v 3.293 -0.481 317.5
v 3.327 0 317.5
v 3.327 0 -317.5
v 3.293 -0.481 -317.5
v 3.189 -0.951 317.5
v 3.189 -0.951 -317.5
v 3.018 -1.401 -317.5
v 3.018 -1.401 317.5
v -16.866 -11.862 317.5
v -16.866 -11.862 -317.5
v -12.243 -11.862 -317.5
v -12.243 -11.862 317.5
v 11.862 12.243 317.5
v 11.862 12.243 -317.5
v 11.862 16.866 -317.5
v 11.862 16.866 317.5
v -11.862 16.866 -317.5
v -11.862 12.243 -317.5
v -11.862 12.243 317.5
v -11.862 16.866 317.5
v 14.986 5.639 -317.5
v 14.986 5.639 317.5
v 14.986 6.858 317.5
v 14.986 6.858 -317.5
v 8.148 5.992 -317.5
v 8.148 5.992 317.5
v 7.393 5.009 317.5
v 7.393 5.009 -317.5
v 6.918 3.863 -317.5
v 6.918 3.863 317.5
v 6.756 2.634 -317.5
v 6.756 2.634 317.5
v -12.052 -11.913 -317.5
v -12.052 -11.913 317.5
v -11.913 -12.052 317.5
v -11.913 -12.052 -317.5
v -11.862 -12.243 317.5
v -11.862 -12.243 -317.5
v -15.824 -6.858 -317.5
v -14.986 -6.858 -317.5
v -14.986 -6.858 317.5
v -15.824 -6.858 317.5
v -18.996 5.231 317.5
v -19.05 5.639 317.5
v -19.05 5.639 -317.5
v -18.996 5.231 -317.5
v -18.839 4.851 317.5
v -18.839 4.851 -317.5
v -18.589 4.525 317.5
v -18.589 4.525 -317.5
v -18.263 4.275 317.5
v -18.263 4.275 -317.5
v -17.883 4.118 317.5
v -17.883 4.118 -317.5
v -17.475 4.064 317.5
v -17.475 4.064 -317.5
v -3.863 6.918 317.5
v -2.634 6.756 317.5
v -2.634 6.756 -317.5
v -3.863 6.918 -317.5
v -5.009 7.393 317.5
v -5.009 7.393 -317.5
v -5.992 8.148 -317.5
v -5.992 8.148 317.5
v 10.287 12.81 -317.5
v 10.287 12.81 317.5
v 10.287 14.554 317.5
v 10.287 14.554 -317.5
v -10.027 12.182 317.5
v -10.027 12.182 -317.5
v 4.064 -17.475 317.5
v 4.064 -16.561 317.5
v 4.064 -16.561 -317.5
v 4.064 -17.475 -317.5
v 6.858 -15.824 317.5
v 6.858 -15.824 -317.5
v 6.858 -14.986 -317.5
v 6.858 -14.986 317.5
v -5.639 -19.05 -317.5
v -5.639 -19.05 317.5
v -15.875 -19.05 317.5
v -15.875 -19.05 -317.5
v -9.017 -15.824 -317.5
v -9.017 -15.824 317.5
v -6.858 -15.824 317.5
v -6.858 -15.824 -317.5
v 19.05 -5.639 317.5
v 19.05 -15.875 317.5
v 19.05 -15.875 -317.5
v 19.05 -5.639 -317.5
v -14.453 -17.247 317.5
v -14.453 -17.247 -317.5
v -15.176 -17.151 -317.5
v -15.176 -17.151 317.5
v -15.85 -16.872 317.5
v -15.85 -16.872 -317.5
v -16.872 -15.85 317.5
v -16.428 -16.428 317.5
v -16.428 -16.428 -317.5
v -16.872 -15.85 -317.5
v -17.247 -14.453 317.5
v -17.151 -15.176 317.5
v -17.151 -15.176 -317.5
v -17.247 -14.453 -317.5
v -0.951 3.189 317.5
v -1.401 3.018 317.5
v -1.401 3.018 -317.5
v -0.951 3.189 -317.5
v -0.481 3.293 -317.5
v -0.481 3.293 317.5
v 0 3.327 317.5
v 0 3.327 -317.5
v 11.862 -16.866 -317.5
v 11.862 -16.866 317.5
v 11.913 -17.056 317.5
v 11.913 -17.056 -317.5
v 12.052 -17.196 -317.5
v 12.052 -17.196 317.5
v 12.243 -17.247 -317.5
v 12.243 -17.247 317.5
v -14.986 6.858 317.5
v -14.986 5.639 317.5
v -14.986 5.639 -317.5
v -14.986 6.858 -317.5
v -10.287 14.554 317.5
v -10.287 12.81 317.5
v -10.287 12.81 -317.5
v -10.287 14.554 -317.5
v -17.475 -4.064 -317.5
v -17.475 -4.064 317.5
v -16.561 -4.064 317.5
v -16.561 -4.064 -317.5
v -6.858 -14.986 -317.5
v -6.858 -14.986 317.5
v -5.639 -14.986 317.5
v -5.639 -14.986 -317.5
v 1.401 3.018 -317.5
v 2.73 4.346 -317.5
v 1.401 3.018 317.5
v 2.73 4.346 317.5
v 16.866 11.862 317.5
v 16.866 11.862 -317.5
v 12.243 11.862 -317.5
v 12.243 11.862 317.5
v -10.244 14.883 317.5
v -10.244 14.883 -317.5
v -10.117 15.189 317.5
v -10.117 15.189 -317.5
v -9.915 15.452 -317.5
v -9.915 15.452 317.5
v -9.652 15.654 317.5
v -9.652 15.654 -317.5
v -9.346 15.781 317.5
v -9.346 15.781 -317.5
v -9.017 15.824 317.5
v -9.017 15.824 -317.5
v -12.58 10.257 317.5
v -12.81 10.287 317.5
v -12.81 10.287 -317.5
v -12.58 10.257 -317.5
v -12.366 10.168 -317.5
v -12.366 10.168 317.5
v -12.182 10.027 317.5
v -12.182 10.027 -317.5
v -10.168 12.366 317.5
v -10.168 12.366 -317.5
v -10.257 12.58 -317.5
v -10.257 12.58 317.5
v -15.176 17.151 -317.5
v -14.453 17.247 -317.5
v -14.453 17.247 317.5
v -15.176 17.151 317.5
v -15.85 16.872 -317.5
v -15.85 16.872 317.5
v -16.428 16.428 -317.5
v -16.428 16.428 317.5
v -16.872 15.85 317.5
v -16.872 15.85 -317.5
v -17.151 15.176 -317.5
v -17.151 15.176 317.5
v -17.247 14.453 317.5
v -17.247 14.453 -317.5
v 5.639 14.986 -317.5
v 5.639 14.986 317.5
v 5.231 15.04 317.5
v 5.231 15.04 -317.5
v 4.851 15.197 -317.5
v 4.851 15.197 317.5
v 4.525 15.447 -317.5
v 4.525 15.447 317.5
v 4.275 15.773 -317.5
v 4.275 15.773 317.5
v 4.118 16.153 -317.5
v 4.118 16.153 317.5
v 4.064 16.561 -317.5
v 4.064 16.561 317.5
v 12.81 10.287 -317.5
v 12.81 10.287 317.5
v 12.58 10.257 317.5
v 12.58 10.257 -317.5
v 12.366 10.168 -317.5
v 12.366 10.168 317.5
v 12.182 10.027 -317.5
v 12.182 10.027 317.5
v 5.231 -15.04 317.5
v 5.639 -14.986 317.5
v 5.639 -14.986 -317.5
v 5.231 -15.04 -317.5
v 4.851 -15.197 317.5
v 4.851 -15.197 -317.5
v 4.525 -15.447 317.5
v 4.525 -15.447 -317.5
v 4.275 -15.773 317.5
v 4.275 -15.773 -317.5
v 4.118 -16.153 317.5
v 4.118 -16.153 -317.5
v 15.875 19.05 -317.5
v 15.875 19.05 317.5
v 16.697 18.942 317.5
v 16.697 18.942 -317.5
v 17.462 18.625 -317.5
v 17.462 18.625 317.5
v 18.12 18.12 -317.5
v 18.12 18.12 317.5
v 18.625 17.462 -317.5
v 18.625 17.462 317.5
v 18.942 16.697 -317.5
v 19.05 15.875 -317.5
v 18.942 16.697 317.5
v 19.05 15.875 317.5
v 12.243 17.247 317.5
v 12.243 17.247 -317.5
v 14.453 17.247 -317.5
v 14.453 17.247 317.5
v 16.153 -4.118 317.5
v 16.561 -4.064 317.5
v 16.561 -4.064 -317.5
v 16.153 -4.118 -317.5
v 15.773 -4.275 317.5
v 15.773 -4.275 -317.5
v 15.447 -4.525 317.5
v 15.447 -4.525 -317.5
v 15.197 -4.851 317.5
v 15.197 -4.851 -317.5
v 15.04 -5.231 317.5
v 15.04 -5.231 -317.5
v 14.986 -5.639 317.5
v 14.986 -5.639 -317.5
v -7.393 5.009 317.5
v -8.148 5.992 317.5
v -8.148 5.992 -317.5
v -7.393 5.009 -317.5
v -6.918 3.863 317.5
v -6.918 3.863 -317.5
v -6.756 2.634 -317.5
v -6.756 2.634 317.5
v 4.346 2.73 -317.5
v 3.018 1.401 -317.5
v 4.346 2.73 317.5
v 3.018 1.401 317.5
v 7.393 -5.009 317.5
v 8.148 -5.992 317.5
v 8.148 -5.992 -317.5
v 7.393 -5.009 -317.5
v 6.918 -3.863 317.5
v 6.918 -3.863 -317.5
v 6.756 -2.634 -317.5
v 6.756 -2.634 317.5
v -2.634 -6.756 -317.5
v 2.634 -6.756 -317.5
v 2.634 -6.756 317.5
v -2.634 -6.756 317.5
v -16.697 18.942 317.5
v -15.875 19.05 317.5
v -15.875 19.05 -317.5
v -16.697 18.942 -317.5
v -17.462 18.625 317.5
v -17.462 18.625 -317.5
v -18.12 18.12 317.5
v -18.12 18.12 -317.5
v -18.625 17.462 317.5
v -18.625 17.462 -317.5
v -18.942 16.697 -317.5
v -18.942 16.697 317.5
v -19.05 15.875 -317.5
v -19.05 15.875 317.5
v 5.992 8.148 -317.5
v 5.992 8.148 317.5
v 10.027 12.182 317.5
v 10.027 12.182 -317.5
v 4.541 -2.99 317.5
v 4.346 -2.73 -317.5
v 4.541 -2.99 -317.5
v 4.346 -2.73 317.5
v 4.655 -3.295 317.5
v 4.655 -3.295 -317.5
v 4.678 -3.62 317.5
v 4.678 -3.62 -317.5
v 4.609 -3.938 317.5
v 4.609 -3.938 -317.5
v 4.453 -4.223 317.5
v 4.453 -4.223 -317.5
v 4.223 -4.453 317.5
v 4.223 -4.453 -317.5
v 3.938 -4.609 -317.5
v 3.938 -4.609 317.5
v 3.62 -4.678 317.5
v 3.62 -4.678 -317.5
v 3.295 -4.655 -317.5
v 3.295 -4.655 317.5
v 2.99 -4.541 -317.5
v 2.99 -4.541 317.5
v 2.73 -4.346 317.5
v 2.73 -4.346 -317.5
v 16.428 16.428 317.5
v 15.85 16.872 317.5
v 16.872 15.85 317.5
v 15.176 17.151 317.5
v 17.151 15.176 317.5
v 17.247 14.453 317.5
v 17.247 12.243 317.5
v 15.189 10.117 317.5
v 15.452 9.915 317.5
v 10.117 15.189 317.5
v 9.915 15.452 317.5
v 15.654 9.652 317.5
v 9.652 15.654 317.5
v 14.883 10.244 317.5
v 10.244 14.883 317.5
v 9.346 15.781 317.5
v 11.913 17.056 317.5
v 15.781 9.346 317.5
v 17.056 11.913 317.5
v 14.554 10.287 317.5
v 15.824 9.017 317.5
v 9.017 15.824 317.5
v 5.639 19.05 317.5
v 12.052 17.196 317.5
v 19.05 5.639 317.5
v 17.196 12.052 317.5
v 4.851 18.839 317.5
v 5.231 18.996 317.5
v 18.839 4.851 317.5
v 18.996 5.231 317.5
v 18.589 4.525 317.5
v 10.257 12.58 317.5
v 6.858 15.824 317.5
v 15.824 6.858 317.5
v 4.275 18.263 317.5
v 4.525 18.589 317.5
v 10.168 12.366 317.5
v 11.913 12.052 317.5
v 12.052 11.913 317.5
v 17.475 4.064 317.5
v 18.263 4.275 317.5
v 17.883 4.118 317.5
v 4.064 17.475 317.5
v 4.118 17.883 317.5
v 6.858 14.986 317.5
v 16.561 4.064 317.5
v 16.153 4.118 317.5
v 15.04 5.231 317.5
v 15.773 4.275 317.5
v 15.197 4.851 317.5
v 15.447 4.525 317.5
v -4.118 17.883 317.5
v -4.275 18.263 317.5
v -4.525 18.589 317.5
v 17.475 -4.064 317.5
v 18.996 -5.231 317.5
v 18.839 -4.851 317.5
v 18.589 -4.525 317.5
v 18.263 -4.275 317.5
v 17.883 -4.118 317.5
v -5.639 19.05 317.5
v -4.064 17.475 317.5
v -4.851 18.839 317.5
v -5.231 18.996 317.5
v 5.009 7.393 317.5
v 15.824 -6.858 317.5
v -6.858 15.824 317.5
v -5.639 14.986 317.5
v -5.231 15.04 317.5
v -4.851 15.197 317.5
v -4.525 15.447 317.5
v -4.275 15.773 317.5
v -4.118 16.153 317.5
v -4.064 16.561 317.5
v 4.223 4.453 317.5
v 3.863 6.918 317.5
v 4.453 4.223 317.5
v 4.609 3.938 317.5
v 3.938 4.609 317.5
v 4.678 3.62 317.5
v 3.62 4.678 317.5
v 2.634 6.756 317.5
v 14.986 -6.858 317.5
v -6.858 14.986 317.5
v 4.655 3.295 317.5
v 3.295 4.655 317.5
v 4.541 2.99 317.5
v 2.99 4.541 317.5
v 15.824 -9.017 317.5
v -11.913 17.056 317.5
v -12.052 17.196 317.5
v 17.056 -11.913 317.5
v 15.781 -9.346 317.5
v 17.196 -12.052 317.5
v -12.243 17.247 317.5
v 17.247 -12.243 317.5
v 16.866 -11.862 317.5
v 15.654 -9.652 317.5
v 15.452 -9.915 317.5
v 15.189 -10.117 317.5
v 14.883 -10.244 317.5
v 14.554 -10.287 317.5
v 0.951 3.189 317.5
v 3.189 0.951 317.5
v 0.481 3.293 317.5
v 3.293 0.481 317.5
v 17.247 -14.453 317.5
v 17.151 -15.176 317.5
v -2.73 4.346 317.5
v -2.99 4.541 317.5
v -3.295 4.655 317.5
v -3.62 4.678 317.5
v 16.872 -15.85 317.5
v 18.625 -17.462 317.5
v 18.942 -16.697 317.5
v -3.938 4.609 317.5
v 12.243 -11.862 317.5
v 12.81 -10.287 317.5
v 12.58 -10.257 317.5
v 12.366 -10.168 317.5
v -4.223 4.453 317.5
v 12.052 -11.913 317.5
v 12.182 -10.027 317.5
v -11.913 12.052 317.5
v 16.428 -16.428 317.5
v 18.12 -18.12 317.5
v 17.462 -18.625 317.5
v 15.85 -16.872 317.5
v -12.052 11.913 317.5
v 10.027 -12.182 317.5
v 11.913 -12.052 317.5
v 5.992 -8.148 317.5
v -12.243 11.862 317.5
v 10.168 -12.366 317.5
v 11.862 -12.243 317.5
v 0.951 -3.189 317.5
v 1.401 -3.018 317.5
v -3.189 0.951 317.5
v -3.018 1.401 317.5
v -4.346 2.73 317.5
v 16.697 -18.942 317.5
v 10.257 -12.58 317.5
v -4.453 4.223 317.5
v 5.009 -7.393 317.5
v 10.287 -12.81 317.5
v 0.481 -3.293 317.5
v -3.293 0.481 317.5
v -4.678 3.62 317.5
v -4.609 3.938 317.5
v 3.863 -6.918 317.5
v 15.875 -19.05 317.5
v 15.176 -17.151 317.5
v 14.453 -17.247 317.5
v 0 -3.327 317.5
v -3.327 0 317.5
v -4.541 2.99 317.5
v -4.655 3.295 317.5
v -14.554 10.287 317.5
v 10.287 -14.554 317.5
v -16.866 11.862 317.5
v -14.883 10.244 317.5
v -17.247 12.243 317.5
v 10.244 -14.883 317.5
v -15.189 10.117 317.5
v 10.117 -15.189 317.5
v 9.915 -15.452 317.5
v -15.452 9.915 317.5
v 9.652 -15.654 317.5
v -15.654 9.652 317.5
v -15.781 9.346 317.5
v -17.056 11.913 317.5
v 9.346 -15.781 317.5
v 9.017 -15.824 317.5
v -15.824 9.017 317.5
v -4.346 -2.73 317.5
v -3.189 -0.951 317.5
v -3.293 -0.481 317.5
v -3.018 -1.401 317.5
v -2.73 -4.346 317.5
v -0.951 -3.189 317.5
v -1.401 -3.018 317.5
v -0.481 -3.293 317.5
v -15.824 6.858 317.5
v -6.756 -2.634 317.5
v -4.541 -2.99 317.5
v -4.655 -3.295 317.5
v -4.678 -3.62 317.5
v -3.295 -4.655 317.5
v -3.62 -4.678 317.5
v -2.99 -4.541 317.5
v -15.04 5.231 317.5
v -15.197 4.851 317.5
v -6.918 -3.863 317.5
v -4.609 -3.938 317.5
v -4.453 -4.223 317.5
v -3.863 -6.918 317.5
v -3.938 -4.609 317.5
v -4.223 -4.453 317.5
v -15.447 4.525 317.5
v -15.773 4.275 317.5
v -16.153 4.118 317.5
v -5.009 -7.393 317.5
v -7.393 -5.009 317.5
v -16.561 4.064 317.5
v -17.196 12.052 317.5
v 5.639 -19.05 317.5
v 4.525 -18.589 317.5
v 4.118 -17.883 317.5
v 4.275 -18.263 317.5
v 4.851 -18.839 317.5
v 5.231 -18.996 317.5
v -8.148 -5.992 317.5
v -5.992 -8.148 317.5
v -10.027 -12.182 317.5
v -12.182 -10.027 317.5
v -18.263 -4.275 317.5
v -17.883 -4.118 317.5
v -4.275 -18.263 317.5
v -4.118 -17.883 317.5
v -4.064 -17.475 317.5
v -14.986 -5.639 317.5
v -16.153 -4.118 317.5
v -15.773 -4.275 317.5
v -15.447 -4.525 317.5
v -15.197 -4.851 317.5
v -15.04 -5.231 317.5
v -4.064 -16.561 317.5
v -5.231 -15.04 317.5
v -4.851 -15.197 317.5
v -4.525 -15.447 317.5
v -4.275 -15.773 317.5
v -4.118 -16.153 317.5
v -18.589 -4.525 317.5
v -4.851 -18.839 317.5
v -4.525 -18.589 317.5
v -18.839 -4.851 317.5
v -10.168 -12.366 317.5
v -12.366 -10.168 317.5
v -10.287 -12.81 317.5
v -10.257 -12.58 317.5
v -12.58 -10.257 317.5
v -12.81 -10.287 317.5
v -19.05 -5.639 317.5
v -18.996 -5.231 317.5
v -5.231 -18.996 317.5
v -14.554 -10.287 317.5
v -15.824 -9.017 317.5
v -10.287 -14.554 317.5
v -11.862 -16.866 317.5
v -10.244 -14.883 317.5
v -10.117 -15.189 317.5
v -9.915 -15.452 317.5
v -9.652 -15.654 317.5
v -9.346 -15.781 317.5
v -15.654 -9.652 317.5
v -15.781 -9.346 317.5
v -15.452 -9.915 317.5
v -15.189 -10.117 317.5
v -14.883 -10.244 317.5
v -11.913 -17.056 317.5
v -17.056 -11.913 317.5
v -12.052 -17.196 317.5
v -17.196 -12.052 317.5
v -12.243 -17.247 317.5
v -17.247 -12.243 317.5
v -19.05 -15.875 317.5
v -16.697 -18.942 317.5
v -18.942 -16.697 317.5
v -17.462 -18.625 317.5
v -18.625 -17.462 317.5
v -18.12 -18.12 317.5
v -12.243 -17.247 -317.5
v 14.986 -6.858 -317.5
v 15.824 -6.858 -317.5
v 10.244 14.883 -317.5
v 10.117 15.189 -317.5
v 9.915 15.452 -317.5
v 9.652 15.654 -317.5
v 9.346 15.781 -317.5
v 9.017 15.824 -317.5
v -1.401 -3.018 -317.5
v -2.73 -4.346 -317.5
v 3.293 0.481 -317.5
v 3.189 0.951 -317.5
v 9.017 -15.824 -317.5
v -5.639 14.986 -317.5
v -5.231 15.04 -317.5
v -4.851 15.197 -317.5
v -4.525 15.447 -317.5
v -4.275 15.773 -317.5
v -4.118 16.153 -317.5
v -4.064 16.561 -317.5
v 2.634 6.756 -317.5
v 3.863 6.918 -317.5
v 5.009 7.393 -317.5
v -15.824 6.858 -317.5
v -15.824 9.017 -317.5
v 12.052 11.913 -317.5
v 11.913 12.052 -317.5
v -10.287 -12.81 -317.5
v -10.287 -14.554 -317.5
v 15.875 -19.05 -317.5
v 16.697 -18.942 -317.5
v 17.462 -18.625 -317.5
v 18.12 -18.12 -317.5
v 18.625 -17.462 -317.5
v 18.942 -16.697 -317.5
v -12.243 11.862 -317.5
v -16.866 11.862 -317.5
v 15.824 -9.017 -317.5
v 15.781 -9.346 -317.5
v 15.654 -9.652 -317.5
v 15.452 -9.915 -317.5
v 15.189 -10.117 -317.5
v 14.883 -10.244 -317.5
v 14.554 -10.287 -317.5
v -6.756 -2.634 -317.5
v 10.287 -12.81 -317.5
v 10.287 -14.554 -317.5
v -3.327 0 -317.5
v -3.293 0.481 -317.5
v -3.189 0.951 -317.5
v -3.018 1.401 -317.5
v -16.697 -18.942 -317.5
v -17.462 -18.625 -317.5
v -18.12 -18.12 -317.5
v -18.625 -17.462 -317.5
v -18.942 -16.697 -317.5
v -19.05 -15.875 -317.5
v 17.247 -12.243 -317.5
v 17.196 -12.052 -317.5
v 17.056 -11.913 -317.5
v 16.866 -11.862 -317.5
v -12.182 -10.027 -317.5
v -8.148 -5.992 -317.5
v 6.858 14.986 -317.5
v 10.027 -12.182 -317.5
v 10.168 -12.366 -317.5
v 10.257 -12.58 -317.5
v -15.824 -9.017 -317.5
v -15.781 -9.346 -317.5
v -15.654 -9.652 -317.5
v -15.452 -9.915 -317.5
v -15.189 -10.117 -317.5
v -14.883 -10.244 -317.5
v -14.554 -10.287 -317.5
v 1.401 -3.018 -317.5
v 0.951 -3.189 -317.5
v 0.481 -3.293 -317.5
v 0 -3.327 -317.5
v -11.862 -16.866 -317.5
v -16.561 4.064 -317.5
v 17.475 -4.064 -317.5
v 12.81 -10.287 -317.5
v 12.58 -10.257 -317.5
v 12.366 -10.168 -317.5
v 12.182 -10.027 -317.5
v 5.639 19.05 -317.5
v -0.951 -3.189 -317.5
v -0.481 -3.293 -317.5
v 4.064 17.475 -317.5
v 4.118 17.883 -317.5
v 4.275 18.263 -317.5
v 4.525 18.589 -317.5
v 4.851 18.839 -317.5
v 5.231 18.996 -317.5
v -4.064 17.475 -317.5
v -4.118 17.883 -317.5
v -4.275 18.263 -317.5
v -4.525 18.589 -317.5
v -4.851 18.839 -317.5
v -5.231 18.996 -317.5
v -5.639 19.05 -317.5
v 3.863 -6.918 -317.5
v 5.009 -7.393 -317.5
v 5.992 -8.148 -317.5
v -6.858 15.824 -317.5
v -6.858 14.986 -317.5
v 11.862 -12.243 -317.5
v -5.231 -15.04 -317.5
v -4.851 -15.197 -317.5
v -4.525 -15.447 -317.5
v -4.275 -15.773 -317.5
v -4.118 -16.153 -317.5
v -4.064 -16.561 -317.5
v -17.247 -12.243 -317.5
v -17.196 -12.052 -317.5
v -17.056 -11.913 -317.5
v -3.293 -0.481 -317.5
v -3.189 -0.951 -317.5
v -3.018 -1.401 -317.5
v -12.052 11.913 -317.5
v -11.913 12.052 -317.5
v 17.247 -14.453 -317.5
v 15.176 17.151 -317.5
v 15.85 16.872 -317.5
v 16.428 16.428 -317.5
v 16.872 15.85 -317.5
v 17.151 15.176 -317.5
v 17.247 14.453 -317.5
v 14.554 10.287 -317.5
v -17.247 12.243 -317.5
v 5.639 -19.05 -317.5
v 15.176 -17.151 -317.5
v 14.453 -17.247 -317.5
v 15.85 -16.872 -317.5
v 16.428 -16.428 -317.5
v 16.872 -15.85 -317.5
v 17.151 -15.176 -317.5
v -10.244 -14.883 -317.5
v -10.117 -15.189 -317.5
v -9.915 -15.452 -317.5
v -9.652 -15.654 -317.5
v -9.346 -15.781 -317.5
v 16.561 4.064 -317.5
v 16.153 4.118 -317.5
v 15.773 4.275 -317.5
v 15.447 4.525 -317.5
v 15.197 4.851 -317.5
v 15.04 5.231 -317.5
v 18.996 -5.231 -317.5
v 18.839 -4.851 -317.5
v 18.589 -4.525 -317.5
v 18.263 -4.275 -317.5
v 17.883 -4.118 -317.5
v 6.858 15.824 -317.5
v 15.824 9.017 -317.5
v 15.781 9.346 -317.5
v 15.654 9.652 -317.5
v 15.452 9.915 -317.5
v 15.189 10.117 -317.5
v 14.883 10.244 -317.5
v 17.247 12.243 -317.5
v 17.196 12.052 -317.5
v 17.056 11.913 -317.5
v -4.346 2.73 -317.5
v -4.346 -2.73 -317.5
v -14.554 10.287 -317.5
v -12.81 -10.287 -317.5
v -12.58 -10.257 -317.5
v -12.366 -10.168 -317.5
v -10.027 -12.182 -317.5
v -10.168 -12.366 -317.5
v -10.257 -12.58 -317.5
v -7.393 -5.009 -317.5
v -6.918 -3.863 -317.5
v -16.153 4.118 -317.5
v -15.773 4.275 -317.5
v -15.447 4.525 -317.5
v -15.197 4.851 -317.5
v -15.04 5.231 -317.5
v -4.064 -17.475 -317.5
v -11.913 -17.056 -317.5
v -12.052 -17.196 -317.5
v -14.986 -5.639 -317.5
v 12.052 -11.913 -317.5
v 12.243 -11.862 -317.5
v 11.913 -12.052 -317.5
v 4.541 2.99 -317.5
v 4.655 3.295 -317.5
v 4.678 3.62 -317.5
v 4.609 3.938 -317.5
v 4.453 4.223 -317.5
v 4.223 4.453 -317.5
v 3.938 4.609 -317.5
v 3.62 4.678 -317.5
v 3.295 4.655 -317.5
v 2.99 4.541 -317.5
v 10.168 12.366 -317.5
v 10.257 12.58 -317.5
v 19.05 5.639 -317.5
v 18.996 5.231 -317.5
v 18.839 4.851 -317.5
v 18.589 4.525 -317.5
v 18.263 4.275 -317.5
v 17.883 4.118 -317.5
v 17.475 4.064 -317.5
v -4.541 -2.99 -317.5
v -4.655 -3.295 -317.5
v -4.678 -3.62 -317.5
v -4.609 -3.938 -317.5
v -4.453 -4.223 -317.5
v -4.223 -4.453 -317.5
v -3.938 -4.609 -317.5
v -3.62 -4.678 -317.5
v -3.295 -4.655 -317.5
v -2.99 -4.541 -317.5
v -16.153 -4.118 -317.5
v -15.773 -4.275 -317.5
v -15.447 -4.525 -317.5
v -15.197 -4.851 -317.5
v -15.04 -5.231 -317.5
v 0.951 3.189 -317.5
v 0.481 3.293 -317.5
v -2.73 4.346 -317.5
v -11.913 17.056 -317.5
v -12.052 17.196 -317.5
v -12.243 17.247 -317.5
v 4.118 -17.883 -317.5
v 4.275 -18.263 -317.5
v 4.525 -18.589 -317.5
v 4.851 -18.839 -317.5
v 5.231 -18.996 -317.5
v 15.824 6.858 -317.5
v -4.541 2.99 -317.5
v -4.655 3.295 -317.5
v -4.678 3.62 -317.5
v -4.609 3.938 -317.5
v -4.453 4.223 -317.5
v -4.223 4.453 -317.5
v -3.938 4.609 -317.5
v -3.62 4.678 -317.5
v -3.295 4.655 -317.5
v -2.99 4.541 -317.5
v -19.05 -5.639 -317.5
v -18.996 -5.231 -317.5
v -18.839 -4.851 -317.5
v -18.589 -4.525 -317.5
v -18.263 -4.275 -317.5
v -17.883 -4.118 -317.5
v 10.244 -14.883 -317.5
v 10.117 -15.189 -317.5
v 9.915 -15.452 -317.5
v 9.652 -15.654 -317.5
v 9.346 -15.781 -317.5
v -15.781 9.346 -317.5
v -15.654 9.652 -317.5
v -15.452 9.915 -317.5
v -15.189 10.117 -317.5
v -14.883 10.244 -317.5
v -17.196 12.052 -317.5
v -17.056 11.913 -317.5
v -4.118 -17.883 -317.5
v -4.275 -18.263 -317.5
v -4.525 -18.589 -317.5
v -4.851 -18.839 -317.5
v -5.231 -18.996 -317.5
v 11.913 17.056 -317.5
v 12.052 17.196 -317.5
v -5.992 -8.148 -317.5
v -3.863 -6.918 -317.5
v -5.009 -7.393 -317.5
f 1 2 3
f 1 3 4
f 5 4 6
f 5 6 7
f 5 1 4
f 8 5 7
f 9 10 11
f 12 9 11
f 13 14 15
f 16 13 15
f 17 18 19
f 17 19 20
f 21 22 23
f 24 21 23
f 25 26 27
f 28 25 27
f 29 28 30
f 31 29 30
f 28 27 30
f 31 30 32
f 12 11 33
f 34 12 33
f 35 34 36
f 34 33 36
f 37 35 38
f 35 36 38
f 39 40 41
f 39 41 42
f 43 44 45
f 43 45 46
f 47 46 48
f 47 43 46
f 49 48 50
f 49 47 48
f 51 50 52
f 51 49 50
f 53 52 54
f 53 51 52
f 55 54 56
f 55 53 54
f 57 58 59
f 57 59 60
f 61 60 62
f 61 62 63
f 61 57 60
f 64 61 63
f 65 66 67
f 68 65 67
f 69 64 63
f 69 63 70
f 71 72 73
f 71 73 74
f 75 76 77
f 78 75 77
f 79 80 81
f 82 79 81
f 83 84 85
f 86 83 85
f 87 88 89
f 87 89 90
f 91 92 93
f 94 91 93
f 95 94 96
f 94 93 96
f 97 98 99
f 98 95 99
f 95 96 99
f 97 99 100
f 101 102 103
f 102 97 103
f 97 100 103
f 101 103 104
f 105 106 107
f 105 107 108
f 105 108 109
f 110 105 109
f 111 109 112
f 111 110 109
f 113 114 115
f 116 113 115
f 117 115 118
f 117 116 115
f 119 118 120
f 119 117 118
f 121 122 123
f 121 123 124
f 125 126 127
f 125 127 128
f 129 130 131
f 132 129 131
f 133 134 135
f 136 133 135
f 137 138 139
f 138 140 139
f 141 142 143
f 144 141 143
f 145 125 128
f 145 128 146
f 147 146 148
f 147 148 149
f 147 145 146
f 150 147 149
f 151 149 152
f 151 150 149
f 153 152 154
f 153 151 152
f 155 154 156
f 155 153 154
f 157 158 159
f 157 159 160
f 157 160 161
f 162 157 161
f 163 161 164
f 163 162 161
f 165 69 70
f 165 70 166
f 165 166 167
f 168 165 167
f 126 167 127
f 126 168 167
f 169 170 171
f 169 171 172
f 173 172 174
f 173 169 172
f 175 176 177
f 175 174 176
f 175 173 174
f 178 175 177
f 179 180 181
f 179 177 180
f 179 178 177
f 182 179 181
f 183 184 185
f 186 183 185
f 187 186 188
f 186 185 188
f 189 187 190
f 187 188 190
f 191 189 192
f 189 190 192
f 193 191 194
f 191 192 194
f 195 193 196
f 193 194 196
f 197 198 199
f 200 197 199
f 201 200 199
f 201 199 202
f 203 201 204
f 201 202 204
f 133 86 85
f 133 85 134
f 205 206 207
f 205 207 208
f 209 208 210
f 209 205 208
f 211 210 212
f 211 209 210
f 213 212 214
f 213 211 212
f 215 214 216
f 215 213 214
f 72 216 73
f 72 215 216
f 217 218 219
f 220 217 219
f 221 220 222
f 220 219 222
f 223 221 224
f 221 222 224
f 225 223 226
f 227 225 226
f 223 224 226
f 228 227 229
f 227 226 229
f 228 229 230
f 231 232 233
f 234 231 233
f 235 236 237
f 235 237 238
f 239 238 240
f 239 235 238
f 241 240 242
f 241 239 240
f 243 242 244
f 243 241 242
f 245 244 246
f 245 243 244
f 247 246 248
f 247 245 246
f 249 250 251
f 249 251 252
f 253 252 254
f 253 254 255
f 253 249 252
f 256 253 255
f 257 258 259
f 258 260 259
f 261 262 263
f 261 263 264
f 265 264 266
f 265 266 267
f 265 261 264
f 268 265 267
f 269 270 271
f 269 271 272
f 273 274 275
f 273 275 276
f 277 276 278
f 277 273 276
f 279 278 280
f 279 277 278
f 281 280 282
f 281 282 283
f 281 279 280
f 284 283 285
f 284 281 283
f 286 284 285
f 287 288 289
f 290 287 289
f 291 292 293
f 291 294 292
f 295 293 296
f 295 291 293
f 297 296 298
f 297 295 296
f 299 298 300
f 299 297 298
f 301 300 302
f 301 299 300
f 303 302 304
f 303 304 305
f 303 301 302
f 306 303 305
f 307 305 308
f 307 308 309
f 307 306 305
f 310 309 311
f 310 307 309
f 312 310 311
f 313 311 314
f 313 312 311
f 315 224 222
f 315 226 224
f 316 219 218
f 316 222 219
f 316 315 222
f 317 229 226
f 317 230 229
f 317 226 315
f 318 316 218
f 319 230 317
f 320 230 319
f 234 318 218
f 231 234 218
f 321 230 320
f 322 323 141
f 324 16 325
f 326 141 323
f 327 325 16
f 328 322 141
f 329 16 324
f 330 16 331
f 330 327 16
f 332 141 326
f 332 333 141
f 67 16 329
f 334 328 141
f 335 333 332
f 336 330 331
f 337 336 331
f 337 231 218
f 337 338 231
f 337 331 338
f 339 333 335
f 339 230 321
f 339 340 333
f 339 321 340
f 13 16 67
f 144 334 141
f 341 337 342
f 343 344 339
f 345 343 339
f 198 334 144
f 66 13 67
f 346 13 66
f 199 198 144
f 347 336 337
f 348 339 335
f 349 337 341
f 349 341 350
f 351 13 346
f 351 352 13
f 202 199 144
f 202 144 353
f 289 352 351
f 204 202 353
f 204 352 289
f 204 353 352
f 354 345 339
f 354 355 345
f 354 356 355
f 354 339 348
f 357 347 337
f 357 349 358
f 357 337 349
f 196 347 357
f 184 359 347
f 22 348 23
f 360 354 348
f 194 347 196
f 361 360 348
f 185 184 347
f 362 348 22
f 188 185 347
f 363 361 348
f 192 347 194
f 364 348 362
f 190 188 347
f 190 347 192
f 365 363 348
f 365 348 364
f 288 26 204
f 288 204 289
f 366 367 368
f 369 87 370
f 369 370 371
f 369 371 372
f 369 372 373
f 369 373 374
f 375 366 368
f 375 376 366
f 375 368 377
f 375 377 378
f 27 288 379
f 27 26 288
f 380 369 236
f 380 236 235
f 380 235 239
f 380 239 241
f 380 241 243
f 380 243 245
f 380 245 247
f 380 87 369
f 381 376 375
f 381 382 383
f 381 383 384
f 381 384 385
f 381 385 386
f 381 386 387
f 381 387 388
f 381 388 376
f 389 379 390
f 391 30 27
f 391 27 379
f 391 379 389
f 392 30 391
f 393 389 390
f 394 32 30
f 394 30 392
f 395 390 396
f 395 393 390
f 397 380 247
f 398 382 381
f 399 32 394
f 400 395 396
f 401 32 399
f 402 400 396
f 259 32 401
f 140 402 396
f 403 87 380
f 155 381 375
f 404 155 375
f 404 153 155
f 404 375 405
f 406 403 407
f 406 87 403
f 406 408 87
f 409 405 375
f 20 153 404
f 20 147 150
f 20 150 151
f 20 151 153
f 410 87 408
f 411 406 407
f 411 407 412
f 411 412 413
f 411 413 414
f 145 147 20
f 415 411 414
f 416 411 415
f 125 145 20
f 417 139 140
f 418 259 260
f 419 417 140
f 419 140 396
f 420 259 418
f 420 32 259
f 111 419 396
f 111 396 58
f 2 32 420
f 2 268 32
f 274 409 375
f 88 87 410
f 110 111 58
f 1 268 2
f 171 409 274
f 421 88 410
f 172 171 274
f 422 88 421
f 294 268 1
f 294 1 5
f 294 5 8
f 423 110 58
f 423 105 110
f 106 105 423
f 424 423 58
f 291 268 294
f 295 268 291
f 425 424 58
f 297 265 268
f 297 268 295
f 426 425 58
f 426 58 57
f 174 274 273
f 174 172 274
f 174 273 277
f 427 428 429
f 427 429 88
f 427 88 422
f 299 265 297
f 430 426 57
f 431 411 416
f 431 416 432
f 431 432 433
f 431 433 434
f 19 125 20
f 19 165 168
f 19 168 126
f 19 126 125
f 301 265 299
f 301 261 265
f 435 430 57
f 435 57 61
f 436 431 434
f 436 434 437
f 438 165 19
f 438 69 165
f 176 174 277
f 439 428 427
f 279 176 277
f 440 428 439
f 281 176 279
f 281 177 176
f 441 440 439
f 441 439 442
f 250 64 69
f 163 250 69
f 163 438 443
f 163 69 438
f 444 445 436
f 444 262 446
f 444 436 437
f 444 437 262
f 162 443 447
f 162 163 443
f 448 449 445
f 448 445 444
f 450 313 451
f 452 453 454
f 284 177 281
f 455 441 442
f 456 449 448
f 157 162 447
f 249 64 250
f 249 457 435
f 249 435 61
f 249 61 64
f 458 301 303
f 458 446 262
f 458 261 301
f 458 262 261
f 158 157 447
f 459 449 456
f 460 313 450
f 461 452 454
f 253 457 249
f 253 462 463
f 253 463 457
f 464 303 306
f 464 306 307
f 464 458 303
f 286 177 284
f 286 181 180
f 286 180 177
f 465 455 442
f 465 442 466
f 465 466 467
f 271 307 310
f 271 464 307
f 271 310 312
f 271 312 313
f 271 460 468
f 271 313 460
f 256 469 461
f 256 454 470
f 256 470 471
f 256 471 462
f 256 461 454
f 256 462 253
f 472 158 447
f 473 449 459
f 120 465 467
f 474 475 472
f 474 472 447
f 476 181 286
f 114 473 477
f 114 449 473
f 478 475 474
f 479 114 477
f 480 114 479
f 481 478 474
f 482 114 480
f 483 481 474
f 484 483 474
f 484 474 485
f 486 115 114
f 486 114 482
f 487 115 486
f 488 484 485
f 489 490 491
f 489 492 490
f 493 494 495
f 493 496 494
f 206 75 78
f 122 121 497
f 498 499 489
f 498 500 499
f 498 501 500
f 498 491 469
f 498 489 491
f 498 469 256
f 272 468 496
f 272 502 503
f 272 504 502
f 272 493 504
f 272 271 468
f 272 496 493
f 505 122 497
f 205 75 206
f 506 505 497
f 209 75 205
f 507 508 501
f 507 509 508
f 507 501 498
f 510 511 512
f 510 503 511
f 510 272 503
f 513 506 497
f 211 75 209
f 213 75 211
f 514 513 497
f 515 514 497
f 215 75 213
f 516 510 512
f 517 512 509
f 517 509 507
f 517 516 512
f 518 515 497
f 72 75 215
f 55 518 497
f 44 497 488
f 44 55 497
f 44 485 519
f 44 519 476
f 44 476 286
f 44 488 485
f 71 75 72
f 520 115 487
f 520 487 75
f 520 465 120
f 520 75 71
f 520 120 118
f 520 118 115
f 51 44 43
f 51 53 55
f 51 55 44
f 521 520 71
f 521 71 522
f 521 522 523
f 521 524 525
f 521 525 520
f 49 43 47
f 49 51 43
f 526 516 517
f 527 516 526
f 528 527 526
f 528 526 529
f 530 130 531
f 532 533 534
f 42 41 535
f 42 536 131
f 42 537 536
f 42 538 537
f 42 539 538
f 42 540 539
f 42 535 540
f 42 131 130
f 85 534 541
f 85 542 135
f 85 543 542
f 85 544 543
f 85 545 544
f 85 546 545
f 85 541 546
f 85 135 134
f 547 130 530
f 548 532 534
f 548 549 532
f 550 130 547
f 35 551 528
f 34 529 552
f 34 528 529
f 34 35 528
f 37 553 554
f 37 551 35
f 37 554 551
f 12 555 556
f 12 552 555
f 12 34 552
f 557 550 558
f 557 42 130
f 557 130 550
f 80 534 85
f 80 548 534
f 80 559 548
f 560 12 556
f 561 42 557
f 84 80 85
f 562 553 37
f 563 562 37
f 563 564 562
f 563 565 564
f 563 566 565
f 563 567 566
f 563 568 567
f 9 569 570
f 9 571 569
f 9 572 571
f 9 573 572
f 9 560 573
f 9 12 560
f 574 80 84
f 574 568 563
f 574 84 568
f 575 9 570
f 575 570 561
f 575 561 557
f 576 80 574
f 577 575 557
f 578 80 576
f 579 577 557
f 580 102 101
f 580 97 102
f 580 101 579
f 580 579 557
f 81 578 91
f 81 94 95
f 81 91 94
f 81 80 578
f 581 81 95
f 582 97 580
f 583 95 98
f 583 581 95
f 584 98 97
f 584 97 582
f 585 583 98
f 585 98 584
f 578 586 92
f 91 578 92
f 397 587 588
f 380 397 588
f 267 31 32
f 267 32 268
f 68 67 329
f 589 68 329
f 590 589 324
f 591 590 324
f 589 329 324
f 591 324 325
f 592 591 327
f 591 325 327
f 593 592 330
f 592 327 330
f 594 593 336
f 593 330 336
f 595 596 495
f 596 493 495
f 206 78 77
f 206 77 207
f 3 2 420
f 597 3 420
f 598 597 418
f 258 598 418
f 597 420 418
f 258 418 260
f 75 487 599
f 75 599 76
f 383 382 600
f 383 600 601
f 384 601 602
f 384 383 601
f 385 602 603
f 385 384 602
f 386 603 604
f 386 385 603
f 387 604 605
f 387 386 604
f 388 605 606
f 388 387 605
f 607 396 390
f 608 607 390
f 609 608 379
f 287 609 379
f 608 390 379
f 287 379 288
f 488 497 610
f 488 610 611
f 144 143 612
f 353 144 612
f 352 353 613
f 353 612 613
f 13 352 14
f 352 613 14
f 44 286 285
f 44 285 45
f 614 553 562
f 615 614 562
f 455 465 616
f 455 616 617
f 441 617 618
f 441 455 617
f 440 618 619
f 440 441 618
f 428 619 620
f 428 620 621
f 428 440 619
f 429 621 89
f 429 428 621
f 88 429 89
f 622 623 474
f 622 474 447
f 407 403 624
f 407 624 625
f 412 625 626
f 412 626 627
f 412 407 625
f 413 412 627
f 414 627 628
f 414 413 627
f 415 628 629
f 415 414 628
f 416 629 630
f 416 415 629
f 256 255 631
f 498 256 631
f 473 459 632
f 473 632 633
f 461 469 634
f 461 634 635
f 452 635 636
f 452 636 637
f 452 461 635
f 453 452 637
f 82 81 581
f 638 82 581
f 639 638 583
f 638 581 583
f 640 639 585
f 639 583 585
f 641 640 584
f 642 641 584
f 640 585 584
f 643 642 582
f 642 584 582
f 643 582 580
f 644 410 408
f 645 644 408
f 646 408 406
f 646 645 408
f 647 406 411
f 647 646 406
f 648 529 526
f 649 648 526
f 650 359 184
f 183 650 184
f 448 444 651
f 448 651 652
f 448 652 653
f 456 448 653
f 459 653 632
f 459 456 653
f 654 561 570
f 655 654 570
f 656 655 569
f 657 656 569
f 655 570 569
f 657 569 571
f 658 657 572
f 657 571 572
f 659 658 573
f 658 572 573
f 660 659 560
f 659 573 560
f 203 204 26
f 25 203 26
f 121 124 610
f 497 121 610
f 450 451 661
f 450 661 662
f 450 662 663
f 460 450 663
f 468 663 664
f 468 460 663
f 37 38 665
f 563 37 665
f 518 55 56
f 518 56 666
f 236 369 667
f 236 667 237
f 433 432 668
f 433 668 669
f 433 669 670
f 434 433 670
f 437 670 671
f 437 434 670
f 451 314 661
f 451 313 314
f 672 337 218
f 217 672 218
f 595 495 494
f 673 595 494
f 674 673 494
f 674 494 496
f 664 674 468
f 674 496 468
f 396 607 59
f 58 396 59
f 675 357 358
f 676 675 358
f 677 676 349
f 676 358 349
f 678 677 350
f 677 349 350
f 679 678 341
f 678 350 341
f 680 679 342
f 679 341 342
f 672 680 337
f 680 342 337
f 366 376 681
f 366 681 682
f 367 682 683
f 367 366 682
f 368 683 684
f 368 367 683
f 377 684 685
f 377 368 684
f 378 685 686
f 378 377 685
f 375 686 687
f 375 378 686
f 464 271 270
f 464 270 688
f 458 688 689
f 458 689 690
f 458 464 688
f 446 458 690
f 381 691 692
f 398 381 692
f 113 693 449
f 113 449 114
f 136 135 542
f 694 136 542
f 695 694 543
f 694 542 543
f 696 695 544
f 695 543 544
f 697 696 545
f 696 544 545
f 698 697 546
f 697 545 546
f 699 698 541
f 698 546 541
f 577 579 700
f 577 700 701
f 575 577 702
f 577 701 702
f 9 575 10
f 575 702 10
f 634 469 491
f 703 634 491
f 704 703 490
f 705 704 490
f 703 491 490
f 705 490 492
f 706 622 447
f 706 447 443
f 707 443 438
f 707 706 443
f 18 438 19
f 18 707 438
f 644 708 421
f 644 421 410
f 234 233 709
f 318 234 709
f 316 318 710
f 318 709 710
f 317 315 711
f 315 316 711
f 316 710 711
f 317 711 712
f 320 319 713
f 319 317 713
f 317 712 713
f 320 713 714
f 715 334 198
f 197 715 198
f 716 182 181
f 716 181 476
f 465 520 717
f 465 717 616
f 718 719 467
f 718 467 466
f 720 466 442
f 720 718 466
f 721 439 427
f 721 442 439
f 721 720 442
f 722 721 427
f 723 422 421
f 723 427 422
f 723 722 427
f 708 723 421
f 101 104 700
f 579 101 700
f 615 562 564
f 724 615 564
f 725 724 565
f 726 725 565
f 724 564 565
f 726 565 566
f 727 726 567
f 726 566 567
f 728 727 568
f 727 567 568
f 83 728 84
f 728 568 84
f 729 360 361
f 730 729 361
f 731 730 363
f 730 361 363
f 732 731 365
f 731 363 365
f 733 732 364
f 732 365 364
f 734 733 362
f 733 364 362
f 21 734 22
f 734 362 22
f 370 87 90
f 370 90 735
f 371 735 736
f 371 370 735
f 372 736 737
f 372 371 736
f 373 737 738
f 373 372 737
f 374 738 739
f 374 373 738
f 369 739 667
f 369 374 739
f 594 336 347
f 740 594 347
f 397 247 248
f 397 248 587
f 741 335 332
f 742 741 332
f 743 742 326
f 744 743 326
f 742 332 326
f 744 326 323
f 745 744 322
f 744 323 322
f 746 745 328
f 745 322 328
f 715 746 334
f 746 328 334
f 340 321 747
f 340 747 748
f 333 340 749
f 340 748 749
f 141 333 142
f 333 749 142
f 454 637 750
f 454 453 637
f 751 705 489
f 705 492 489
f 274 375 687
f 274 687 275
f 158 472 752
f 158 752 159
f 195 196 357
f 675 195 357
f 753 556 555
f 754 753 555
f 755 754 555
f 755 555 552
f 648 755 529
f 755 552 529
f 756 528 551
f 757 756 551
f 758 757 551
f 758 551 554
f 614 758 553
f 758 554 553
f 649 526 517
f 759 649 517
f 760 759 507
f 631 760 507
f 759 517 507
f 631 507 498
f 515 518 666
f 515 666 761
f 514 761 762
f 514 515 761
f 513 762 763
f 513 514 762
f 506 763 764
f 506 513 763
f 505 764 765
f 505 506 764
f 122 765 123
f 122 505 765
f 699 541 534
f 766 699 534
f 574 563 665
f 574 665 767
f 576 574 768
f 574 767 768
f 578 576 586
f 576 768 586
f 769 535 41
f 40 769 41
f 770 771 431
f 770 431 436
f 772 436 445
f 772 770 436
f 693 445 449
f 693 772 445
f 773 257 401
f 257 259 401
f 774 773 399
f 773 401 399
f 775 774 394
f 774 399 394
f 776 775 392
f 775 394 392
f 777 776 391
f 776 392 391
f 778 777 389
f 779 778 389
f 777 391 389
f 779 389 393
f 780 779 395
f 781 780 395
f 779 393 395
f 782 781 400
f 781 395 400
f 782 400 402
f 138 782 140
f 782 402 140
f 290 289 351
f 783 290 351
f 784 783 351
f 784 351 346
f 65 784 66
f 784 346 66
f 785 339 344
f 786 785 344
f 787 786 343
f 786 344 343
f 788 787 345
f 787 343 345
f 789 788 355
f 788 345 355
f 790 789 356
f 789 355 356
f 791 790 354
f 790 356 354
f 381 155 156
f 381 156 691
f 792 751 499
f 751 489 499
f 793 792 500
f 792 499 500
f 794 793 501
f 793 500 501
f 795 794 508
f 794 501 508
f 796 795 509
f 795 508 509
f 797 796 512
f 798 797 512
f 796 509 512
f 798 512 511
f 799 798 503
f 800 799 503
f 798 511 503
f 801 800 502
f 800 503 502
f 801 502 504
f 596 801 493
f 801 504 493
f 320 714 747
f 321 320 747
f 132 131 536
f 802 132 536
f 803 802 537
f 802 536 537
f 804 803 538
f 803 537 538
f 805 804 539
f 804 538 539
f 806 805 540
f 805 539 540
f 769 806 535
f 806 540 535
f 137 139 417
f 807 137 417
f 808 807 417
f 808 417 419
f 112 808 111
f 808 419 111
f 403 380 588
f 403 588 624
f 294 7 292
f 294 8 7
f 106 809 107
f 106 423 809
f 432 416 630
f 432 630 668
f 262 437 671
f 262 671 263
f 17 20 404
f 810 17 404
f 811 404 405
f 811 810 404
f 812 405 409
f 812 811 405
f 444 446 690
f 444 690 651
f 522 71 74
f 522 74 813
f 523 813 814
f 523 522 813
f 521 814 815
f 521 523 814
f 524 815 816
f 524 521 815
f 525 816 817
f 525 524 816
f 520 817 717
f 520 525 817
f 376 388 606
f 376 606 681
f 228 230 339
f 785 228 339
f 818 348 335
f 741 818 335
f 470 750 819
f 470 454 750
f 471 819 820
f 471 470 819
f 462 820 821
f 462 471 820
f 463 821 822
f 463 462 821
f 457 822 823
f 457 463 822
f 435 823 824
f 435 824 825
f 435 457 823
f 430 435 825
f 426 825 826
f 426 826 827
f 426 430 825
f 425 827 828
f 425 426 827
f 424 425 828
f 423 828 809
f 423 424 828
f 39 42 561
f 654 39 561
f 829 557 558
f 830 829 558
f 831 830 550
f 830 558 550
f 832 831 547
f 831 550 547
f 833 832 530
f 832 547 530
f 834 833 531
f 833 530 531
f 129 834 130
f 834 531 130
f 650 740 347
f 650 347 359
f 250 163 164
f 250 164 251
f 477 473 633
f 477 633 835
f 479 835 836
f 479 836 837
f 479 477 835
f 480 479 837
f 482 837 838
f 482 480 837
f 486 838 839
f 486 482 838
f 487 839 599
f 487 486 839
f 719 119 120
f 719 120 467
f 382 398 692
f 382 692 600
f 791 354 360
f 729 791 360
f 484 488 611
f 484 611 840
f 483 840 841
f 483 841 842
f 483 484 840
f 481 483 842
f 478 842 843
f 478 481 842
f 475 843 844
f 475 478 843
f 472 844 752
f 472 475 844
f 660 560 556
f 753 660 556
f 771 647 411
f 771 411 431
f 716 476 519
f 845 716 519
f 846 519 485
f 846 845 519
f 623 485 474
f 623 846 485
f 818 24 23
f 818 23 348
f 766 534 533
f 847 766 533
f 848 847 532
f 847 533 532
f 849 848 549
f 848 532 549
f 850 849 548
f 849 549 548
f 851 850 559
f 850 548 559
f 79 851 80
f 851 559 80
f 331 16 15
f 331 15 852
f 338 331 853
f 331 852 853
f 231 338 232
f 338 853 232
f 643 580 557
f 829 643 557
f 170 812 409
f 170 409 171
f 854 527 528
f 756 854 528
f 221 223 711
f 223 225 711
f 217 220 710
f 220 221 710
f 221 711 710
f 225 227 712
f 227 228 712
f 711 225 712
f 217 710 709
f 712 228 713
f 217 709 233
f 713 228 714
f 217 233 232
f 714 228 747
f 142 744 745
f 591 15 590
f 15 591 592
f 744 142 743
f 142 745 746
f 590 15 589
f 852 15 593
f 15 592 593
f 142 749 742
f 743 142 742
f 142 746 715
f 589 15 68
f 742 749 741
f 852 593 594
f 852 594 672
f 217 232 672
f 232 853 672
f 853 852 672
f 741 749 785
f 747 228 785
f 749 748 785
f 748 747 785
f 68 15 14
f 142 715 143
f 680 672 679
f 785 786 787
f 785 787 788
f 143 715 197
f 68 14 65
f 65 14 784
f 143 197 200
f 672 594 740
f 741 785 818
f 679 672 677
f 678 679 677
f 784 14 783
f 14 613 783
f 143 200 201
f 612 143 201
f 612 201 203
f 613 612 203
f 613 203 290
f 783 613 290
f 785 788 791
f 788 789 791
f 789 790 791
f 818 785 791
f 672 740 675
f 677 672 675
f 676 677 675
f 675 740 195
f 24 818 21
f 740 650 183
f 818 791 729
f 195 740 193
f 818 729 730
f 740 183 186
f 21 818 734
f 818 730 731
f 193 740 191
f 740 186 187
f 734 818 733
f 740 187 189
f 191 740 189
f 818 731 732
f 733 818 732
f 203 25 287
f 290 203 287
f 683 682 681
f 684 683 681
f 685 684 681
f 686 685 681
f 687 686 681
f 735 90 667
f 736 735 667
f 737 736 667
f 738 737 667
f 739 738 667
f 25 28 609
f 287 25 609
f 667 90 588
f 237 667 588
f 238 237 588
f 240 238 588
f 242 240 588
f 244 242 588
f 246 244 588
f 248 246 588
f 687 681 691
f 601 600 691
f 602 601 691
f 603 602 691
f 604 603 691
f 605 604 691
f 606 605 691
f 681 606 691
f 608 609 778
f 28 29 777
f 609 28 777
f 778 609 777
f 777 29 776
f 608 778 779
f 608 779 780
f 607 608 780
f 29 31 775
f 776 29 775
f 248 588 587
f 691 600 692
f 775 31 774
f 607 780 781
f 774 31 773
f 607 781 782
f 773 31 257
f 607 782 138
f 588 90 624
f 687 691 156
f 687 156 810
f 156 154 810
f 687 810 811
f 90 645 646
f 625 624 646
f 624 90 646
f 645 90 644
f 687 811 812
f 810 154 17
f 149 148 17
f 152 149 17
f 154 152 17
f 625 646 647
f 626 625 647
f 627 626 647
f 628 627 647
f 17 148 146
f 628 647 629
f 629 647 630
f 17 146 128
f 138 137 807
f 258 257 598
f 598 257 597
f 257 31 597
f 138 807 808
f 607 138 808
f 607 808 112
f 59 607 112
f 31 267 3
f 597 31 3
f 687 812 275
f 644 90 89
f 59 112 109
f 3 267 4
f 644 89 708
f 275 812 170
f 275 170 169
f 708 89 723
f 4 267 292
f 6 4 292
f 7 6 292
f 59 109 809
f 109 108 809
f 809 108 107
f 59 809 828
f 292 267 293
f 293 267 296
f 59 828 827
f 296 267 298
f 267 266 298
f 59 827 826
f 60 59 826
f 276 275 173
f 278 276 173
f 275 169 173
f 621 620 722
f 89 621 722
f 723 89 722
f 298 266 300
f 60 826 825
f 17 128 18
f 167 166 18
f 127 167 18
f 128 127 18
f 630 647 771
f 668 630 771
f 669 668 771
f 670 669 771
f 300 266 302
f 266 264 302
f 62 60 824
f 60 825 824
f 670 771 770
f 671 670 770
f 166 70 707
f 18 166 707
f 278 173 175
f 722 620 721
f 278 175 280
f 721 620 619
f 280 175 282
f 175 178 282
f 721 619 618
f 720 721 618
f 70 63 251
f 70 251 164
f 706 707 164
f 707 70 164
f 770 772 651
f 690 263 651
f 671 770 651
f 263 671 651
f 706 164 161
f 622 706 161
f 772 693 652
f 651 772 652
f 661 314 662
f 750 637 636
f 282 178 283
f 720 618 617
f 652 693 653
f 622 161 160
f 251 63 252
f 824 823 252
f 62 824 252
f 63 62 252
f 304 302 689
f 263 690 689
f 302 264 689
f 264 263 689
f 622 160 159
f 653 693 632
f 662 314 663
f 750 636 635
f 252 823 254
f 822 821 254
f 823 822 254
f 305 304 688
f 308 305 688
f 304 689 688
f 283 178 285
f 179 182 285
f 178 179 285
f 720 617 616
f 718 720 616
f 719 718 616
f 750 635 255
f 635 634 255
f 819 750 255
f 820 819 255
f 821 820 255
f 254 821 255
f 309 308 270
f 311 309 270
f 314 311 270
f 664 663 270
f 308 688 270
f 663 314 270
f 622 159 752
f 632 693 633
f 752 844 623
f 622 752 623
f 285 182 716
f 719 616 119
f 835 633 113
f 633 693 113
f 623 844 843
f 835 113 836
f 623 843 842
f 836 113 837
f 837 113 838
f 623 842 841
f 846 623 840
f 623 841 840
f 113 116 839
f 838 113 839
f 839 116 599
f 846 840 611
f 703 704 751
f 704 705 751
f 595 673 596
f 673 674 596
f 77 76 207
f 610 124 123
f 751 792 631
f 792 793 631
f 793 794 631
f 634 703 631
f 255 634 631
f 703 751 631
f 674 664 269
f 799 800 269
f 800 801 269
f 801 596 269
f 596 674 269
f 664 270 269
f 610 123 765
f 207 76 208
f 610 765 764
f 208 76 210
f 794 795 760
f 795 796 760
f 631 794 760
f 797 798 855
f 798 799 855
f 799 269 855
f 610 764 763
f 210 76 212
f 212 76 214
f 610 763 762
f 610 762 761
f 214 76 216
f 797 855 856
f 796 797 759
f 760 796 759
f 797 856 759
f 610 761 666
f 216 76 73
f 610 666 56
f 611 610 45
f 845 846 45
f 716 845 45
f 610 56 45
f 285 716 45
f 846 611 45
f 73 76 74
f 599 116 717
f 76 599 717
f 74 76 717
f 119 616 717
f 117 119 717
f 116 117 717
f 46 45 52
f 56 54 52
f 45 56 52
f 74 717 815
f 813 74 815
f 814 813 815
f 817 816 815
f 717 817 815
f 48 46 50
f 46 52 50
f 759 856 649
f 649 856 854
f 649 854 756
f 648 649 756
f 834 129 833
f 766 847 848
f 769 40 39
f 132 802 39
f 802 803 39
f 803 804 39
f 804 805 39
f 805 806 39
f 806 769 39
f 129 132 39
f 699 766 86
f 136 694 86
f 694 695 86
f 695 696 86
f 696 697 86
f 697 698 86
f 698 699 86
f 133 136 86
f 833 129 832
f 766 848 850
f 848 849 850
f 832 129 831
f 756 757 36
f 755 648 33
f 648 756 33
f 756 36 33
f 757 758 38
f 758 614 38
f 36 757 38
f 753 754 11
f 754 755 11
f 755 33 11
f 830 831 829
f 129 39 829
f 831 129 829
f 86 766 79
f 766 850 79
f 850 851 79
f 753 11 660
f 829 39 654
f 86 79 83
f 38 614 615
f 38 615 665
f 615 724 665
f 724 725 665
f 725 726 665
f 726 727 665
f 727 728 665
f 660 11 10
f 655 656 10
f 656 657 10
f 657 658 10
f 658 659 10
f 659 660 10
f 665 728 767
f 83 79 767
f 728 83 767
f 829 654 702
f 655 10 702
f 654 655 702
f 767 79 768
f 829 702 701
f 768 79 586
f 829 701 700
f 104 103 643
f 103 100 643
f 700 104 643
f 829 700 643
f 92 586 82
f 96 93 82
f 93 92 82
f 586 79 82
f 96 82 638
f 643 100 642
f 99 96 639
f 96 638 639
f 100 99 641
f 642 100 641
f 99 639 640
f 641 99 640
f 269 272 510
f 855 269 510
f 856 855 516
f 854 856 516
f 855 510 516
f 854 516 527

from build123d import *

# Parameters (mm, degrees)
BOSS_EXTRUDE1_DEPTH     = 317.5
CUT_EXTRUDE1_DEPTH      = 319.640949973
CUT_EXTRUDE1_DEPTH_BACK = 319.640949973


with BuildPart() as part:
    # Sketch4 → Boss-Extrude1 (new, symmetric)
    with BuildSketch(Plane.XY):
        with BuildLine():
            Line((2.729997861, -4.346443963), (1.401430967, -3.017877069))
            ThreePointArc((1.401430967, -3.017877069), (0.717602467, -3.249097946), (0, -3.3274))
            Line((0, -3.3274), (0, -6.7564))
            Line((0, -6.7564), (2.633706952, -6.7564))
            ThreePointArc((2.633706952, -6.7564), (4.451376719, -7.117956996), (5.992322742, -8.147584211))
            Line((5.992322742, -8.147584211), (10.026617928, -12.181879398))
            ThreePointArc((10.026617928, -12.181879398), (10.219328904, -12.470291755), (10.287, -12.810497326))
            Line((10.287, -12.810497326), (10.287, -14.5542))
            ThreePointArc((10.287, -14.5542), (9.915025612, -15.452225612), (9.017, -15.8242))
            Line((9.017, -15.8242), (6.858, -15.8242))
            Line((6.858, -15.8242), (6.858, -14.986))
            Line((6.858, -14.986), (5.6388, -14.986))
            ThreePointArc((5.6388, -14.986), (4.525248241, -15.447248241), (4.064, -16.5608))
            Line((4.064, -16.5608), (4.064, -17.4752))
            ThreePointArc((4.064, -17.4752), (4.525248241, -18.588751759), (5.6388, -19.05))
            Line((5.6388, -19.05), (15.875, -19.05))
            ThreePointArc((15.875, -19.05), (18.12006403, -18.12006403), (19.05, -15.875))
            Line((19.05, -15.875), (19.05, -5.6388))
            ThreePointArc((19.05, -5.6388), (18.588751759, -4.525248241), (17.4752, -4.064))
            Line((17.4752, -4.064), (16.5608, -4.064))
            ThreePointArc((16.5608, -4.064), (15.447248241, -4.525248241), (14.986, -5.6388))
            Line((14.986, -5.6388), (14.986, -6.858))
            Line((14.986, -6.858), (15.8242, -6.858))
            Line((15.8242, -6.858), (15.8242, -9.017))
            ThreePointArc((15.8242, -9.017), (15.452225612, -9.915025612), (14.5542, -10.287))
            Line((14.5542, -10.287), (12.810497326, -10.287))
            ThreePointArc((12.810497326, -10.287), (12.470291755, -10.219328904), (12.181879398, -10.026617928))
            Line((12.181879398, -10.026617928), (8.147584211, -5.992322742))
            ThreePointArc((8.147584211, -5.992322742), (7.117956996, -4.451376719), (6.7564, -2.633706952))
            Line((6.7564, -2.633706952), (6.7564, 0))
            Line((6.7564, 0), (3.3274, 0))
            ThreePointArc((3.3274, 0), (3.249097946, -0.717602467), (3.017877069, -1.401430967))
            Line((3.017877069, -1.401430967), (4.346443963, -2.729997861))
            ThreePointArc((4.346443963, -2.729997861), (4.346443963, -4.346443963), (2.729997861, -4.346443963))
        make_face()
    extrude(amount=BOSS_EXTRUDE1_DEPTH, both=True)

    # Sketch5 → Cut-Extrude1 (cut, two sides: drawn at the far end of the back side and taken through both)
    with BuildSketch(Plane.XY.offset(-CUT_EXTRUDE1_DEPTH_BACK)):
        with BuildLine():
            Line((16.8656, -11.8618), (12.2428, -11.8618))
            ThreePointArc((12.2428, -11.8618), (11.973392316, -11.973392316), (11.8618, -12.2428))
            Line((11.8618, -12.2428), (11.8618, -16.8656))
            ThreePointArc((11.8618, -16.8656), (11.973392316, -17.135007684), (12.2428, -17.2466))
            Line((12.2428, -17.2466), (14.4526, -17.2466))
            ThreePointArc((14.4526, -17.2466), (16.428256347, -16.428256347), (17.2466, -14.4526))
            Line((17.2466, -14.4526), (17.2466, -12.2428))
            ThreePointArc((17.2466, -12.2428), (17.135007684, -11.973392316), (16.8656, -11.8618))
        make_face()
    extrude(amount=CUT_EXTRUDE1_DEPTH + CUT_EXTRUDE1_DEPTH_BACK, mode=Mode.SUBTRACT)

    # Mirror1: part across plane


with BuildPart() as part_1:
    add(part.part)
    add(part.part.mirror(Plane(origin=(0, 0, 0), x_dir=(0, 0, 1), z_dir=(1, 0, 0))))

    # Mirror2: part across plane


with BuildPart() as part_2:
    add(part_1.part)
    add(part_1.part.mirror(Plane.ZX))


solid = part_2.part
